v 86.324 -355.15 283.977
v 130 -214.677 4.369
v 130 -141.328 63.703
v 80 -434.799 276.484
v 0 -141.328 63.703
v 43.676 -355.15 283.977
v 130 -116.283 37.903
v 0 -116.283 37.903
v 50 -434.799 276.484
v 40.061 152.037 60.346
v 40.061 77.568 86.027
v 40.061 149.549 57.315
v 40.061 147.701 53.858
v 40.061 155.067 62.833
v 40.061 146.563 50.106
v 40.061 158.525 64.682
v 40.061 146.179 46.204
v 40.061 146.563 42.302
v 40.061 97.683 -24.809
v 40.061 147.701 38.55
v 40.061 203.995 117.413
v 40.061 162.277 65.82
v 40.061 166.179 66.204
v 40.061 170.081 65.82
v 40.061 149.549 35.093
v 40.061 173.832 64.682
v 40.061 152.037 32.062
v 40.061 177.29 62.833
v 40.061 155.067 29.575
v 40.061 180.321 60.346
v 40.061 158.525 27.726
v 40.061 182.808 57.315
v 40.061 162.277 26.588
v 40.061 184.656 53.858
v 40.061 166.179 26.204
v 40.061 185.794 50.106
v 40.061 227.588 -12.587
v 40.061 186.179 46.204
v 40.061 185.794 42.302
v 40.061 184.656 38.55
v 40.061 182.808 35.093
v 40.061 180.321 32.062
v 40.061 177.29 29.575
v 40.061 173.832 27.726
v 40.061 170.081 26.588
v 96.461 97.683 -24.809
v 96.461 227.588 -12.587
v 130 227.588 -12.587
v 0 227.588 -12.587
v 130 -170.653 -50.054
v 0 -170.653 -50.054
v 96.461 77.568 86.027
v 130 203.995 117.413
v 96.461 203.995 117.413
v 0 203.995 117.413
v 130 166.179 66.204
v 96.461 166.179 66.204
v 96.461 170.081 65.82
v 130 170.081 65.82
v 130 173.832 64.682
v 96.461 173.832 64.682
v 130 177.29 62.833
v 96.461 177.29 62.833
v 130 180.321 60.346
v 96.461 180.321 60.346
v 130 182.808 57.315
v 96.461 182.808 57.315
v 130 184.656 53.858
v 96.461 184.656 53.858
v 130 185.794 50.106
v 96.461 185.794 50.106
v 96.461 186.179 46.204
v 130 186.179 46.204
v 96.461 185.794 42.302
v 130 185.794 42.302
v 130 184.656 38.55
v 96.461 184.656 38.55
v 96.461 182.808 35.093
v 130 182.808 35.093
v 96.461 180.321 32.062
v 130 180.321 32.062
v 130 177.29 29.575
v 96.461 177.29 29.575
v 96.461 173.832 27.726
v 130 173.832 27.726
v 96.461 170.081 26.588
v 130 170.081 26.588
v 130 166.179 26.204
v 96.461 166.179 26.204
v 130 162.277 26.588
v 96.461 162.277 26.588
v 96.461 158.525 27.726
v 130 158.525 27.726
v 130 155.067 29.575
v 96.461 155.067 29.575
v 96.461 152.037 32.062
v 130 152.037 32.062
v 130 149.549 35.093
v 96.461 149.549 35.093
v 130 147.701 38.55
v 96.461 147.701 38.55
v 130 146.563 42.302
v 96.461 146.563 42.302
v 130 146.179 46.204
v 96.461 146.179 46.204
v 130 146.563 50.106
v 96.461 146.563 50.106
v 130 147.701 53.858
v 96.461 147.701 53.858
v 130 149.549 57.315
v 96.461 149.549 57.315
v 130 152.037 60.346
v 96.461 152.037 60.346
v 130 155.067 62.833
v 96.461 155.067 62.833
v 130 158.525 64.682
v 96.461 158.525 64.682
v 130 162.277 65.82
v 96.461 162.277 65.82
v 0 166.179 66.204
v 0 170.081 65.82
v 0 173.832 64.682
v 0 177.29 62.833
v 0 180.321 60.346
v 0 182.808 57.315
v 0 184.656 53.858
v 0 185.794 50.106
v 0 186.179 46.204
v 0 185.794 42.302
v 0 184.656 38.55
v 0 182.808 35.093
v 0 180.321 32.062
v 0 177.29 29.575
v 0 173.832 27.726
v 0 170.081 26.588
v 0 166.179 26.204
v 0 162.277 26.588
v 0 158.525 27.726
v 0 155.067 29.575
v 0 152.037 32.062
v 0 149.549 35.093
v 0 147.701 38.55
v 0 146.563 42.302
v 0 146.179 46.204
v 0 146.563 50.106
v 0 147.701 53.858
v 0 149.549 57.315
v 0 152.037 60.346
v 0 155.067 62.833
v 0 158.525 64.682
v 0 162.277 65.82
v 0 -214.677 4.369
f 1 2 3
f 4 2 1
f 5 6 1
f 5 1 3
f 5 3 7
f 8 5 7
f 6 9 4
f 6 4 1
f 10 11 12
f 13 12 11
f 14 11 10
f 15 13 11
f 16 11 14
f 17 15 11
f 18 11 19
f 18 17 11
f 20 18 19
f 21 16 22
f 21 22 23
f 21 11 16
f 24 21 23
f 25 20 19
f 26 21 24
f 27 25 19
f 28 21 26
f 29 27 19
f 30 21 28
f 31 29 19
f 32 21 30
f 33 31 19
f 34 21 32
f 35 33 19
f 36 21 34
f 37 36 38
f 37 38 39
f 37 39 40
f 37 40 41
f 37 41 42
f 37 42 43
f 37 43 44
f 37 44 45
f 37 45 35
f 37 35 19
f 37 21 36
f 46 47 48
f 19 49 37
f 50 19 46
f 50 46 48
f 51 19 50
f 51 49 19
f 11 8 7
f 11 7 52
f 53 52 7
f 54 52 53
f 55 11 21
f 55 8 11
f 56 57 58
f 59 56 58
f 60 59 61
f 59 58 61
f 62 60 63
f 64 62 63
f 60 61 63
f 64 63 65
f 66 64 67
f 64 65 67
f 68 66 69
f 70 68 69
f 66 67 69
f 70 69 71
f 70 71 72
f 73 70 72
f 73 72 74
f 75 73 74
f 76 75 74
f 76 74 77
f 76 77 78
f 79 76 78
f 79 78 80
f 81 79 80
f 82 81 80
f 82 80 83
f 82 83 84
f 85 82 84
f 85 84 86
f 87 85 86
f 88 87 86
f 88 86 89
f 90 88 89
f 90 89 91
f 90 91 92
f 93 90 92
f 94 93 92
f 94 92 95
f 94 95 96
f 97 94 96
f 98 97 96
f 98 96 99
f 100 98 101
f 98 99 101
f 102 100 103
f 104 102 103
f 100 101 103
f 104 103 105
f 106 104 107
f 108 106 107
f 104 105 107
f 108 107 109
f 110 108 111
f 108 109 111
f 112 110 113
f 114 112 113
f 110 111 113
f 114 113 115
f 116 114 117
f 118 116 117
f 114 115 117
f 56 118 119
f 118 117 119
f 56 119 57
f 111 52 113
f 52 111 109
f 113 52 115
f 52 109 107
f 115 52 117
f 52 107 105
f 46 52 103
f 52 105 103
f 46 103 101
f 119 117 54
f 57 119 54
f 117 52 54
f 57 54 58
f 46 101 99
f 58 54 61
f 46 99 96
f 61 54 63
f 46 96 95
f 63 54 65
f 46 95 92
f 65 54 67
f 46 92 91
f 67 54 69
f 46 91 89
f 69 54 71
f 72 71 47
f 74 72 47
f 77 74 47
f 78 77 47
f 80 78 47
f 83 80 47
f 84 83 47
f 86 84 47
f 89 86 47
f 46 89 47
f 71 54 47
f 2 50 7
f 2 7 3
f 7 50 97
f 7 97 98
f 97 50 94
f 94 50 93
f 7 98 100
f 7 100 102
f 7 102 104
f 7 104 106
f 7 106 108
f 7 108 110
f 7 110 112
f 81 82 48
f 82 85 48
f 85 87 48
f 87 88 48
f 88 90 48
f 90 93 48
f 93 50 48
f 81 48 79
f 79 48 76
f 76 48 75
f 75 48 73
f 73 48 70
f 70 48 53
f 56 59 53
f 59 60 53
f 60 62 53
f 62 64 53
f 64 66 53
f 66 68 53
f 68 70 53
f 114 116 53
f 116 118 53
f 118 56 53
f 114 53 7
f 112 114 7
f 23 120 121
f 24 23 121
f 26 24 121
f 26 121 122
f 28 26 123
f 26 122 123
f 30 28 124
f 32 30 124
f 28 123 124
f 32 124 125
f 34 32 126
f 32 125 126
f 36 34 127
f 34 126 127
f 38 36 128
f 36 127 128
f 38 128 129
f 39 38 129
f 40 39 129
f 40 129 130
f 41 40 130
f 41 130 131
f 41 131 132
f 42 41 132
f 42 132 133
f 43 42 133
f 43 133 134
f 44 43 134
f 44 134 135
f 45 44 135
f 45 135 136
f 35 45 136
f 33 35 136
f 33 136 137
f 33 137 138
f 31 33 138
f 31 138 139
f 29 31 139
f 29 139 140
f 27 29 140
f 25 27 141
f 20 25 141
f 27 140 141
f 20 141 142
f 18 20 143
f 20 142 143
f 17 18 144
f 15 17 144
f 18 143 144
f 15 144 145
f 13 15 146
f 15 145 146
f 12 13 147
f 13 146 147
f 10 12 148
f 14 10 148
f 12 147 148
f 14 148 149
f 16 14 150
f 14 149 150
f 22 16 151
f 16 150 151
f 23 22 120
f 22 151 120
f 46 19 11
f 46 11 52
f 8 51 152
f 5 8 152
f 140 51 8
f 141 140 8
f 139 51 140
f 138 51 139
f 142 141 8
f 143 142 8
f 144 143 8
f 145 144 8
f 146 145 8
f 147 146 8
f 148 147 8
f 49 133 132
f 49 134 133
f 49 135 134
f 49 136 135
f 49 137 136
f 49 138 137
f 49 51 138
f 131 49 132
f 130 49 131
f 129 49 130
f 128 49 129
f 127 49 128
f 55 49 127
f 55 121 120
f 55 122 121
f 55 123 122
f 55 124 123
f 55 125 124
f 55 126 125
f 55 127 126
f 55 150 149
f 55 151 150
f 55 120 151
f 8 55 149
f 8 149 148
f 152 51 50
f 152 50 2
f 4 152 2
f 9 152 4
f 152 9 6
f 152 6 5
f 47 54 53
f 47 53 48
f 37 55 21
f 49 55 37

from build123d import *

# Parameters (mm, degrees)
EXTRUDE_1_DEPTH     = 130
CUT_EXTRUDE_1_DEPTH = 130
SKETCH_3_W          = 56.400423759
SKETCH_3_H          = 132.12352691
CUT_EXTRUDE_2_DEPTH = 130
SKETCH_4_R          = 20
CUT_EXTRUDE_4_DEPTH = 536.34382743


with BuildPart() as part:
    # 草图1 → 凸台-拉伸1 (new body)
    with BuildSketch(Plane(origin=(0, 0, 0), x_dir=(0, 0, -1), z_dir=(1, 0, 0))):
        Polygon((-117.413418414, 203.995173877), (12.586581586, 227.58810424), (50.05442381, -170.65323063), (-276.483750531, -434.798684306), (-283.977318976, -355.150417332), (-37.902557252, -116.282866203), align=None)
    extrude(amount=EXTRUDE_1_DEPTH)

    # 草图2 → 切除-拉伸1 (cut)
    with BuildSketch(Plane(origin=(0, -127.628376299, -103.242003565), x_dir=(1, 0, 0), z_dir=(0, -0.7774718436693089, -0.6289177468488591))):
        Polygon((130, 138.410940137), (80, 488.410940137), (130, 488.410940137), align=None)
        Polygon((50, 488.410940137), (0, 138.410940137), (0, 488.410940137), align=None)
    extrude(amount=-CUT_EXTRUDE_1_DEPTH, mode=Mode.SUBTRACT)

    # 草图3 → 切除-拉伸2 (cut)
    with BuildSketch(Plane(origin=(0, 218.119745355, 39.585261254), x_dir=(1, 0, 0), z_dir=(0, 0.9839277155275394, 0.17856721596294645))):
        with Locations((68.261248993, -13.037702829)):
            Rectangle(SKETCH_3_W, SKETCH_3_H)
    extrude(amount=-CUT_EXTRUDE_2_DEPTH, mode=Mode.SUBTRACT)

    # 草图4 → 切除-拉伸4 (cut, through all)
    with BuildSketch(Plane.ZY):
        with Locations((46.203978927, 166.178708675)):
            Circle(SKETCH_4_R)
    extrude(amount=-CUT_EXTRUDE_4_DEPTH, mode=Mode.SUBTRACT)


solid = part.part
